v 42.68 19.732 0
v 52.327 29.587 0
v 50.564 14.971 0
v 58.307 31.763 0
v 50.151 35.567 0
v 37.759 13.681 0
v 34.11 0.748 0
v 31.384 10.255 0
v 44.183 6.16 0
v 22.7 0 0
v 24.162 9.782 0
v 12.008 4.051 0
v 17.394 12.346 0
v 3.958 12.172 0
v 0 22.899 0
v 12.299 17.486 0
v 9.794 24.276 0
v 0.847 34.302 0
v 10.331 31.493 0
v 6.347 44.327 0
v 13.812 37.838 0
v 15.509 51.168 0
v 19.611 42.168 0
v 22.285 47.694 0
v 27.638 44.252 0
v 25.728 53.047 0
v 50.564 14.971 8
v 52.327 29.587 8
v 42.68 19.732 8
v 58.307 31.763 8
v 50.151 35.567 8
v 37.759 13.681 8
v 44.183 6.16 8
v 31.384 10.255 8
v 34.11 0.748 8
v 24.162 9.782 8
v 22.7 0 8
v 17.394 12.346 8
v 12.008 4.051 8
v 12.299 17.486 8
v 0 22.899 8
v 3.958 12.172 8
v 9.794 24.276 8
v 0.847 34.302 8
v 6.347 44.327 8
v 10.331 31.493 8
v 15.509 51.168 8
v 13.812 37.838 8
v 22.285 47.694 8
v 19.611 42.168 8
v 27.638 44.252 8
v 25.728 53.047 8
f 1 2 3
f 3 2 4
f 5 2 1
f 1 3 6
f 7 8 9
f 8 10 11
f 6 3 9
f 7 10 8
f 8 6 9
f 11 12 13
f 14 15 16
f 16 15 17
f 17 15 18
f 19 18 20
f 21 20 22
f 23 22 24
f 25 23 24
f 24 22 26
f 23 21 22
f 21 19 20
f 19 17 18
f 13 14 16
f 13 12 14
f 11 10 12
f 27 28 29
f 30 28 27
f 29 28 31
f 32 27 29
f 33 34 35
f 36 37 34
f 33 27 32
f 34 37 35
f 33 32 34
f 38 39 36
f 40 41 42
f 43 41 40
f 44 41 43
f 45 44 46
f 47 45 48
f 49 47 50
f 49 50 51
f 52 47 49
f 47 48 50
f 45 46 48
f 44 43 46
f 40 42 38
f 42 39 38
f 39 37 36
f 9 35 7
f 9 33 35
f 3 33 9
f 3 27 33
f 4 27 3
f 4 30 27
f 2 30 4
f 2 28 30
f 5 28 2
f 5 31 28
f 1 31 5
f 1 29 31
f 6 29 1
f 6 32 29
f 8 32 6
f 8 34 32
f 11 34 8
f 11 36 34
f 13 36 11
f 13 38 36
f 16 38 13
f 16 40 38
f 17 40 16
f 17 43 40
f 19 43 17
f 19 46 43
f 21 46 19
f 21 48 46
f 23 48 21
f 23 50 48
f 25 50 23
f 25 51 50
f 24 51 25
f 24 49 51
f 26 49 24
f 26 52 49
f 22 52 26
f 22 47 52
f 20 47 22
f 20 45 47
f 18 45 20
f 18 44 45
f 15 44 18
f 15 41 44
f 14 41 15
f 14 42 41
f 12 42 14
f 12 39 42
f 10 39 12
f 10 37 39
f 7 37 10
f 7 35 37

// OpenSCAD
$fn = 32;

// ----------------------------------------------------------------------
// Hook plate: curl radius 22 mm over 245 degrees, 9 mm thick band
// ----------------------------------------------------------------------

// --- parameters (mm) ---
profile_height = 8;       // extrusion height
profile_points = 26;      // points of the closed outline

profile = [[22.285, 47.694], [25.728, 53.047], [15.509, 51.168], [6.347, 44.327], [0.847, 34.302], [0, 22.899], [3.958, 12.172], [12.008, 4.051], [22.7, 0], [34.11, 0.748], [44.183, 6.16], [50.564, 14.971], [58.307, 31.763], [52.327, 29.587], [50.151, 35.567], [42.68, 19.732], [37.759, 13.681], [31.384, 10.255], [24.162, 9.782], [17.394, 12.346], [12.299, 17.486], [9.794, 24.276], [10.331, 31.493], [13.812, 37.838], [19.611, 42.168], [27.638, 44.252]];  // single closed polygon, 26 points, counter clockwise

// --- the one profile operation ---
linear_extrude(height = profile_height) polygon(points = profile);
